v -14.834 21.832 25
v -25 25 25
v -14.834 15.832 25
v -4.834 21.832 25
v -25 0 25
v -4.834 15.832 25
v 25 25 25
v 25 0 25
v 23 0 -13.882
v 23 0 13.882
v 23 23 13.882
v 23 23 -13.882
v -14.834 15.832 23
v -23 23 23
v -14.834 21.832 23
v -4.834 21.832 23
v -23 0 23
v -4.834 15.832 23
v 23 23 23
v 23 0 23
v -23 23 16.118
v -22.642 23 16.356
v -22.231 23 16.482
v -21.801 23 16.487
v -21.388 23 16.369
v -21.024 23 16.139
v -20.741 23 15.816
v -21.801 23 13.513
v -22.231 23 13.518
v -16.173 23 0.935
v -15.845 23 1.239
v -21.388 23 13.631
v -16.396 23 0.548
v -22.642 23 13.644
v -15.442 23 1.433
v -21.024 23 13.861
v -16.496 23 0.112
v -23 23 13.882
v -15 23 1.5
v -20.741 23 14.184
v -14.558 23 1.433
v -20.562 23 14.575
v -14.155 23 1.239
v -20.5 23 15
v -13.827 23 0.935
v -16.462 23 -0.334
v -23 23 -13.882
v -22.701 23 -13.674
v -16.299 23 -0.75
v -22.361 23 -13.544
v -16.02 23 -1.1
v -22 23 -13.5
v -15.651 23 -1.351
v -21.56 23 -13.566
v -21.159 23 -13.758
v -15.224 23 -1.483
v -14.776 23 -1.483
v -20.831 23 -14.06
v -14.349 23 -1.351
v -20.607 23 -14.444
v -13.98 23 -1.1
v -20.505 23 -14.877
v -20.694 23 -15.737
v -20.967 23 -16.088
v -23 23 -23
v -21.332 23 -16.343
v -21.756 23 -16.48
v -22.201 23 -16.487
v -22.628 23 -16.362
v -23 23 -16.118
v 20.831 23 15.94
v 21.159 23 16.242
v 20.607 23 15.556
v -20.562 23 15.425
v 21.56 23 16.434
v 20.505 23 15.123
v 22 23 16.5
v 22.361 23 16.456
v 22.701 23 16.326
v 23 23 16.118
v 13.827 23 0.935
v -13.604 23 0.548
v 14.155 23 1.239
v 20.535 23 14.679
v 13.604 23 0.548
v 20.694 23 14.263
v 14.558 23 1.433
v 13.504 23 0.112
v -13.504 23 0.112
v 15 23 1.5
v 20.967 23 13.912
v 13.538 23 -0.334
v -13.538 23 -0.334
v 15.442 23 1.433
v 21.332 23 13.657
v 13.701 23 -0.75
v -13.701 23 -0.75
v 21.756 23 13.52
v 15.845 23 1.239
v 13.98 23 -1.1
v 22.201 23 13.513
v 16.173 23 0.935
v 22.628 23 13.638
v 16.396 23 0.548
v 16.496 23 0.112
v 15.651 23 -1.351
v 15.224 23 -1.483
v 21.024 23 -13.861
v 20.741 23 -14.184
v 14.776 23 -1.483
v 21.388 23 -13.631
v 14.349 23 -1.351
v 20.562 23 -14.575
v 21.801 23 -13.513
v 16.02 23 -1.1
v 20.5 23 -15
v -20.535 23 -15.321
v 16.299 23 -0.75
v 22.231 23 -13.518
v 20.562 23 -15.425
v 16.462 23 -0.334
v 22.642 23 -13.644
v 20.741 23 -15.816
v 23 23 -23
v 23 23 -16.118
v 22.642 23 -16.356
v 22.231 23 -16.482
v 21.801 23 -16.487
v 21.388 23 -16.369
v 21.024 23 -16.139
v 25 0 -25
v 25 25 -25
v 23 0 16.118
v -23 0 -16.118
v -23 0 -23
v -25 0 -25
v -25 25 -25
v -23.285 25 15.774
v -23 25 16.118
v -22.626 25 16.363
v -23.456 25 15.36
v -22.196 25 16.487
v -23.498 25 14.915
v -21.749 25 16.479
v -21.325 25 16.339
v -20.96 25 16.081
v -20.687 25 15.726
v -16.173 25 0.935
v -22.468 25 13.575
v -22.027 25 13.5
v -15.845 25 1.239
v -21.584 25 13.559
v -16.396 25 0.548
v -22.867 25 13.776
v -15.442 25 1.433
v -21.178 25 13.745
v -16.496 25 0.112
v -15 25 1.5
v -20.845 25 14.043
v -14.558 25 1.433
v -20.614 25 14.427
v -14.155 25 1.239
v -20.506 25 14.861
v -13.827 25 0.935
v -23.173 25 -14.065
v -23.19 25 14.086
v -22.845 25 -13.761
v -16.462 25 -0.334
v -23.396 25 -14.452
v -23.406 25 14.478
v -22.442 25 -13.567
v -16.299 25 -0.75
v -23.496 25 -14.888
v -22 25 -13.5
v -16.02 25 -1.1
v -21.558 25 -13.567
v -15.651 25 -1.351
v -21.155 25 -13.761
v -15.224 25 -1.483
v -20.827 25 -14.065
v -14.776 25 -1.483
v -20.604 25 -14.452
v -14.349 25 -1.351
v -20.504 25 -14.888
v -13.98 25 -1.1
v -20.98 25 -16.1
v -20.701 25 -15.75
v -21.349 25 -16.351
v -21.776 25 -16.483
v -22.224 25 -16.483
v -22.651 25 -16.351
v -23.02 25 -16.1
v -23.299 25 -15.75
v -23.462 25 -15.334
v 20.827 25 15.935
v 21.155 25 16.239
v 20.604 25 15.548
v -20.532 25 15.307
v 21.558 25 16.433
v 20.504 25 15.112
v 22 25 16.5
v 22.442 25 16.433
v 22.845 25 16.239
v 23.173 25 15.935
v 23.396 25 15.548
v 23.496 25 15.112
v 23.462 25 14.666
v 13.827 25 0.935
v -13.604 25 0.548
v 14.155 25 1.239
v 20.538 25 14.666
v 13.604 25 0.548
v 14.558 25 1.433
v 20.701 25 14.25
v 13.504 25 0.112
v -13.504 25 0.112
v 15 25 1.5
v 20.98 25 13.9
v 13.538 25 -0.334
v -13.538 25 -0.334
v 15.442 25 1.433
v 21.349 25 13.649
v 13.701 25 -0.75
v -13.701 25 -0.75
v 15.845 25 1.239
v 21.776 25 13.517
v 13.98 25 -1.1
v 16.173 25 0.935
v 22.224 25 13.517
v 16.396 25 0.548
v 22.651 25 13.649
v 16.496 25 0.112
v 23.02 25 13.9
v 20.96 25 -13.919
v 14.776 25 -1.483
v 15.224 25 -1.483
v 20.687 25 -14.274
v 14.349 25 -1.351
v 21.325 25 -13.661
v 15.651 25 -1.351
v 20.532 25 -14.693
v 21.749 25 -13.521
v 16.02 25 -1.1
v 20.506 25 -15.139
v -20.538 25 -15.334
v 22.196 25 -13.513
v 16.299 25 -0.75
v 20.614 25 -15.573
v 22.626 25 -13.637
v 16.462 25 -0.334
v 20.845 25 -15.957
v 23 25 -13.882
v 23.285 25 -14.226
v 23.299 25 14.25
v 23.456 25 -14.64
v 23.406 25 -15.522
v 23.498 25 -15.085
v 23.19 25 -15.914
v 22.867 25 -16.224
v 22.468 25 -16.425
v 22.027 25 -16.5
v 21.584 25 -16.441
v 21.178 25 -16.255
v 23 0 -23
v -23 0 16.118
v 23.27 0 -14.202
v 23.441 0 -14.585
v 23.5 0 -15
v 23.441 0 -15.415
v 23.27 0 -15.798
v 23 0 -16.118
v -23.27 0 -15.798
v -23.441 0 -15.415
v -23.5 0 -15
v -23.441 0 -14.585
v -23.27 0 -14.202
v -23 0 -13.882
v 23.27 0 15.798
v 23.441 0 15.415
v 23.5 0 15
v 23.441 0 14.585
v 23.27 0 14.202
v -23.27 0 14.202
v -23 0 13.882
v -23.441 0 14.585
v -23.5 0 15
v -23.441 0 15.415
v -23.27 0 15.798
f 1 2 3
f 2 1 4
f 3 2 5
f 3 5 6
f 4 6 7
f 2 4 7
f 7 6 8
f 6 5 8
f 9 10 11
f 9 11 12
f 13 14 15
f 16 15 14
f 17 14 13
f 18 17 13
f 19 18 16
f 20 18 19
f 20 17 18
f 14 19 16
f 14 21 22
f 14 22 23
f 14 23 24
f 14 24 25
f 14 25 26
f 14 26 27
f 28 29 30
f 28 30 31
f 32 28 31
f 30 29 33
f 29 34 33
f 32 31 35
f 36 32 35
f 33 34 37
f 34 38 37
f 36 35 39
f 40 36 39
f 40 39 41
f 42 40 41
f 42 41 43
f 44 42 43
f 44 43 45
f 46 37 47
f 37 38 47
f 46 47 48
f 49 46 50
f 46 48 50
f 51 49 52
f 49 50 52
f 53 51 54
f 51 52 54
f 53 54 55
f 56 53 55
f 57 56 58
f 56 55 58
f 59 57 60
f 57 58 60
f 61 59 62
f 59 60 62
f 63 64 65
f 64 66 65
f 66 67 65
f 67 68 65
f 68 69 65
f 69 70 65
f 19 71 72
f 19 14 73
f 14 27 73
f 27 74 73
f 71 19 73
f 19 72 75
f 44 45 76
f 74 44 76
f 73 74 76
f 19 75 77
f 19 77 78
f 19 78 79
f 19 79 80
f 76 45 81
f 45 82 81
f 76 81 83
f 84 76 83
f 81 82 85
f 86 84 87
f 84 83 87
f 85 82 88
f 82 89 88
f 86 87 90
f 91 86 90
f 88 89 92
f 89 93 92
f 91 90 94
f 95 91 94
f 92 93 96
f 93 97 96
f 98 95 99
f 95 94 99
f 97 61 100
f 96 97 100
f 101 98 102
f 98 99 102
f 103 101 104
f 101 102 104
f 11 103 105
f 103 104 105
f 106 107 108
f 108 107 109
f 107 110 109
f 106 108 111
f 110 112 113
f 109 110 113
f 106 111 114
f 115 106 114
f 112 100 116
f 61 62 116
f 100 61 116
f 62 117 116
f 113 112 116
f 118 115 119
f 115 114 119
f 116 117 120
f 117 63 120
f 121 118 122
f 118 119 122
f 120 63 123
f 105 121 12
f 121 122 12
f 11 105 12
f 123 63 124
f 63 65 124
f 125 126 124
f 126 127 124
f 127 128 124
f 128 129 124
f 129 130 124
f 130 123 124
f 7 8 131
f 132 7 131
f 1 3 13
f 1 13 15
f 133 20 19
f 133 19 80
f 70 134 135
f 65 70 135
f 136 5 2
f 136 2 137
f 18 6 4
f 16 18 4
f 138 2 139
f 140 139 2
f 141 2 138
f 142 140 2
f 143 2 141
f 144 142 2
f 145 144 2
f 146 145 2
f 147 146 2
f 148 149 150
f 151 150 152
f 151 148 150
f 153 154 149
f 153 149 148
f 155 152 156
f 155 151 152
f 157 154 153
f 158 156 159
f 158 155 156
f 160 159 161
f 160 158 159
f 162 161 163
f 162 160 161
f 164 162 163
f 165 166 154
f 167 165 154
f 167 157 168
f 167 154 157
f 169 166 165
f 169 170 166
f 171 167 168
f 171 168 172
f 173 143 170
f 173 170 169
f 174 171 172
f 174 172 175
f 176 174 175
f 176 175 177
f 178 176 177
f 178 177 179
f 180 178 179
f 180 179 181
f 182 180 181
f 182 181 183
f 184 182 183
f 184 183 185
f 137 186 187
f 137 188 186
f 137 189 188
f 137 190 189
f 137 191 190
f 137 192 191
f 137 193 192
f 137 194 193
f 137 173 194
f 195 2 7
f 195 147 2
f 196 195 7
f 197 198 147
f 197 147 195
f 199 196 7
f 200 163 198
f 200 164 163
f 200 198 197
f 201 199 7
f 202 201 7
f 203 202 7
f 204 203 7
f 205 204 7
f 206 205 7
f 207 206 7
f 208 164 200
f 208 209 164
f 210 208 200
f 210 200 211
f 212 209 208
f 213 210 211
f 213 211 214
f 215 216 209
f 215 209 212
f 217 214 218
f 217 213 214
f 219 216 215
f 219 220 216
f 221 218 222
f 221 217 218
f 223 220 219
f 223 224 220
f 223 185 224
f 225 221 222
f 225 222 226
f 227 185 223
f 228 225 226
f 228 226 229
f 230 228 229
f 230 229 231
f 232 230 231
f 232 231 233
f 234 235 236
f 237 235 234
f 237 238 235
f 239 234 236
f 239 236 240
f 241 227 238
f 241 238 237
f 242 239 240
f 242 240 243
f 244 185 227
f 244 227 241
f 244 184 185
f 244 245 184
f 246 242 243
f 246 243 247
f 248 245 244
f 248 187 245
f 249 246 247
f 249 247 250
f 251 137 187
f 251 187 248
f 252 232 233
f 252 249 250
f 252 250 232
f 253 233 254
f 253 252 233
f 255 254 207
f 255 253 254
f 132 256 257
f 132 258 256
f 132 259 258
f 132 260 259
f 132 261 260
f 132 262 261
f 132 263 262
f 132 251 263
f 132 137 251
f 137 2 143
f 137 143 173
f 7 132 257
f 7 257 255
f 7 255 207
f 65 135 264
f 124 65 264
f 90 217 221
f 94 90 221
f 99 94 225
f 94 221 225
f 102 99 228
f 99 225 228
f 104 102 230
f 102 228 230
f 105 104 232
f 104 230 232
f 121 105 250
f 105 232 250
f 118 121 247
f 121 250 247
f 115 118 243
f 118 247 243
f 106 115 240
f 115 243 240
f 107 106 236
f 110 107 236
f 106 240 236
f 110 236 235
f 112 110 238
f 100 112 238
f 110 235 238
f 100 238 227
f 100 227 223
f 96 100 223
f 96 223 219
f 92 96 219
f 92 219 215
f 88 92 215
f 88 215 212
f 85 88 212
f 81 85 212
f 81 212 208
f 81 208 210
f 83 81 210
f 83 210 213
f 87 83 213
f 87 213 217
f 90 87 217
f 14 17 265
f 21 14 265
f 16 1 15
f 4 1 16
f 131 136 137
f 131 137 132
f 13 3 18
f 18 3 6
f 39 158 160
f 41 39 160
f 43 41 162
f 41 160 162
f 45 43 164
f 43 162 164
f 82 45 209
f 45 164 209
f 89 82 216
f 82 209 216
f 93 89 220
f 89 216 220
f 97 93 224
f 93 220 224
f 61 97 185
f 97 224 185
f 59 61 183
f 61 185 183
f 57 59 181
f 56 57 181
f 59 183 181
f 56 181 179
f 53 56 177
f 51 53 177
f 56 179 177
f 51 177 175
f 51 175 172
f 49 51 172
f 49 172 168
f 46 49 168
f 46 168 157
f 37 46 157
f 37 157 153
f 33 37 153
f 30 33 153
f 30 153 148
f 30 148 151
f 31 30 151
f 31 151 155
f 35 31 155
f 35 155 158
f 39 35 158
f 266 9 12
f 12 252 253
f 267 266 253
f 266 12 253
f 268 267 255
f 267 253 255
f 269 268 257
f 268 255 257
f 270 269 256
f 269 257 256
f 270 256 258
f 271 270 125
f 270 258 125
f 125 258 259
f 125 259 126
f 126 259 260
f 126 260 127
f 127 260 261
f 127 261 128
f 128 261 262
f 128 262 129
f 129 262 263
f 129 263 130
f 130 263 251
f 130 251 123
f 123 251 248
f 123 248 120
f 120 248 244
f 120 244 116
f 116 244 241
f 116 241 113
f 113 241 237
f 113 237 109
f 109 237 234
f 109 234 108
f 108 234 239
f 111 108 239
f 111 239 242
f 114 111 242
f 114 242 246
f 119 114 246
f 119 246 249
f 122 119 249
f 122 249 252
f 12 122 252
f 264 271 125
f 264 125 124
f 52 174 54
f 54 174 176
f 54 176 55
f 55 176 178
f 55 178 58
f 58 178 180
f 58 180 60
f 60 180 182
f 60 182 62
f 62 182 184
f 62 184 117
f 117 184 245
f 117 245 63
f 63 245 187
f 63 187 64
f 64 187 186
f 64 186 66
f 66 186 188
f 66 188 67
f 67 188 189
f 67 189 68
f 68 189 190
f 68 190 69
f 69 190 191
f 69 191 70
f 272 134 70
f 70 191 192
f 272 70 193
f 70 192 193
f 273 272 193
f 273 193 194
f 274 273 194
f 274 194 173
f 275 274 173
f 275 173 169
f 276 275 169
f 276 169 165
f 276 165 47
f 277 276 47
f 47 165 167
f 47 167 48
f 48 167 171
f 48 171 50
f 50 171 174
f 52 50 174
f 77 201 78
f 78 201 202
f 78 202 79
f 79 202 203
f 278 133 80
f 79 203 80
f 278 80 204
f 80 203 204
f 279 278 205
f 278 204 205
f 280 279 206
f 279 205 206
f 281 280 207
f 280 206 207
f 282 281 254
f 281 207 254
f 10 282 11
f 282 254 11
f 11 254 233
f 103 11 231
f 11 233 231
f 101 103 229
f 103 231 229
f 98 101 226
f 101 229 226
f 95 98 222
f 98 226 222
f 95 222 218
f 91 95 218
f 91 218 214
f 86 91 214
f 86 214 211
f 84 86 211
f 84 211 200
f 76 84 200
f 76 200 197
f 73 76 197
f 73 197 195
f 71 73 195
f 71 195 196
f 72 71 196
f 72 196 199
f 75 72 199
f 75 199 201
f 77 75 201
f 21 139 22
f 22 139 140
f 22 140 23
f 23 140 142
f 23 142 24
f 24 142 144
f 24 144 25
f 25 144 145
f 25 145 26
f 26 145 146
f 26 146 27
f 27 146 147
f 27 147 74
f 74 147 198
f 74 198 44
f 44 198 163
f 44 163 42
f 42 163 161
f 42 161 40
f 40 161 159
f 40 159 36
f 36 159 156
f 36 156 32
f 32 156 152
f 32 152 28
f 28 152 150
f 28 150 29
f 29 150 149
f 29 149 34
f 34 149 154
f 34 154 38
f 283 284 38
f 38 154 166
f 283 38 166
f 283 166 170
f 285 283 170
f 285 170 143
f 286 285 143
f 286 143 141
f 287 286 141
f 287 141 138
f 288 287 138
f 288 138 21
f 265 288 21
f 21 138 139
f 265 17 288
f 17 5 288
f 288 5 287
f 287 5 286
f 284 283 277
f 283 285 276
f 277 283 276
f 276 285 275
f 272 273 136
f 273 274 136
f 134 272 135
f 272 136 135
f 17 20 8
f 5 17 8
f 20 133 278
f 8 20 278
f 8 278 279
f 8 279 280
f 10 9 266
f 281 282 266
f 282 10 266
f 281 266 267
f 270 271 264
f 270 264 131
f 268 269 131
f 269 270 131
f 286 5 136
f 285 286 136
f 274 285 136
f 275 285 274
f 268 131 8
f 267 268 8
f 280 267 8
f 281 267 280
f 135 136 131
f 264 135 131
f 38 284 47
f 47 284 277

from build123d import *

# Parameters (mm, degrees)
SKETCH1_W           = 50
SKETCH1_H           = 50
BOSS_EXTRUDE1_DEPTH = 25
SHELL1_T            = -2
SKETCH3_W           = 10
SKETCH3_H           = 6
CUT_EXTRUDE1_DEPTH  = 12
SKETCH2_R           = 1.5
CUT_EXTRUDE2_DEPTH  = 44.301270189


with BuildPart() as part:
    # Sketch1 → Boss-Extrude1 (new body)
    with BuildSketch(Plane(origin=(0, 0, 0), x_dir=(1, 0, 0), z_dir=(0, 1, 0))):
        Rectangle(SKETCH1_W, SKETCH1_H)
    extrude(amount=BOSS_EXTRUDE1_DEPTH)

    # Shell1
    shell1_openings = [part.faces().sort_by_distance(p)[0] for p in [
        (0, 0, 0),
    ]]
    offset(amount=SHELL1_T, openings=shell1_openings, kind=Kind.INTERSECTION)

    # Sketch3 → Cut-Extrude1 (cut)
    with BuildSketch(Plane.XY.offset(25)):
        with Locations((-9.833582111, 18.831840126)):
            Rectangle(SKETCH3_W, SKETCH3_H)
    extrude(amount=-CUT_EXTRUDE1_DEPTH, mode=Mode.SUBTRACT)

    # Sketch2 → Cut-Extrude2 (cut, through all)
    with BuildSketch(Plane(origin=(0, 25, 0), x_dir=(1, 0, 0), z_dir=(0, 1, 0))):
        with Locations(Location((15, 0, 0), (0, 0, 270))):
            Circle(SKETCH2_R)
        with Locations(Location((-15, 0, 0), (0, 0, 270))):
            Circle(SKETCH2_R)
        with Locations(Location((-22, 15, 0), (0, 0, 270))):
            Circle(SKETCH2_R)
        with Locations(Location((22, 15, 0), (0, 0, 311.810314896))):
            Circle(SKETCH2_R)
        with Locations(Location((22, -15, 0), (0, 0, 270))):
            Circle(SKETCH2_R)
        with Locations(Location((-22, -15, 0), (0, 0, 228.189685104))):
            Circle(SKETCH2_R)
    extrude(amount=-CUT_EXTRUDE2_DEPTH, mode=Mode.SUBTRACT)


solid = part.part
